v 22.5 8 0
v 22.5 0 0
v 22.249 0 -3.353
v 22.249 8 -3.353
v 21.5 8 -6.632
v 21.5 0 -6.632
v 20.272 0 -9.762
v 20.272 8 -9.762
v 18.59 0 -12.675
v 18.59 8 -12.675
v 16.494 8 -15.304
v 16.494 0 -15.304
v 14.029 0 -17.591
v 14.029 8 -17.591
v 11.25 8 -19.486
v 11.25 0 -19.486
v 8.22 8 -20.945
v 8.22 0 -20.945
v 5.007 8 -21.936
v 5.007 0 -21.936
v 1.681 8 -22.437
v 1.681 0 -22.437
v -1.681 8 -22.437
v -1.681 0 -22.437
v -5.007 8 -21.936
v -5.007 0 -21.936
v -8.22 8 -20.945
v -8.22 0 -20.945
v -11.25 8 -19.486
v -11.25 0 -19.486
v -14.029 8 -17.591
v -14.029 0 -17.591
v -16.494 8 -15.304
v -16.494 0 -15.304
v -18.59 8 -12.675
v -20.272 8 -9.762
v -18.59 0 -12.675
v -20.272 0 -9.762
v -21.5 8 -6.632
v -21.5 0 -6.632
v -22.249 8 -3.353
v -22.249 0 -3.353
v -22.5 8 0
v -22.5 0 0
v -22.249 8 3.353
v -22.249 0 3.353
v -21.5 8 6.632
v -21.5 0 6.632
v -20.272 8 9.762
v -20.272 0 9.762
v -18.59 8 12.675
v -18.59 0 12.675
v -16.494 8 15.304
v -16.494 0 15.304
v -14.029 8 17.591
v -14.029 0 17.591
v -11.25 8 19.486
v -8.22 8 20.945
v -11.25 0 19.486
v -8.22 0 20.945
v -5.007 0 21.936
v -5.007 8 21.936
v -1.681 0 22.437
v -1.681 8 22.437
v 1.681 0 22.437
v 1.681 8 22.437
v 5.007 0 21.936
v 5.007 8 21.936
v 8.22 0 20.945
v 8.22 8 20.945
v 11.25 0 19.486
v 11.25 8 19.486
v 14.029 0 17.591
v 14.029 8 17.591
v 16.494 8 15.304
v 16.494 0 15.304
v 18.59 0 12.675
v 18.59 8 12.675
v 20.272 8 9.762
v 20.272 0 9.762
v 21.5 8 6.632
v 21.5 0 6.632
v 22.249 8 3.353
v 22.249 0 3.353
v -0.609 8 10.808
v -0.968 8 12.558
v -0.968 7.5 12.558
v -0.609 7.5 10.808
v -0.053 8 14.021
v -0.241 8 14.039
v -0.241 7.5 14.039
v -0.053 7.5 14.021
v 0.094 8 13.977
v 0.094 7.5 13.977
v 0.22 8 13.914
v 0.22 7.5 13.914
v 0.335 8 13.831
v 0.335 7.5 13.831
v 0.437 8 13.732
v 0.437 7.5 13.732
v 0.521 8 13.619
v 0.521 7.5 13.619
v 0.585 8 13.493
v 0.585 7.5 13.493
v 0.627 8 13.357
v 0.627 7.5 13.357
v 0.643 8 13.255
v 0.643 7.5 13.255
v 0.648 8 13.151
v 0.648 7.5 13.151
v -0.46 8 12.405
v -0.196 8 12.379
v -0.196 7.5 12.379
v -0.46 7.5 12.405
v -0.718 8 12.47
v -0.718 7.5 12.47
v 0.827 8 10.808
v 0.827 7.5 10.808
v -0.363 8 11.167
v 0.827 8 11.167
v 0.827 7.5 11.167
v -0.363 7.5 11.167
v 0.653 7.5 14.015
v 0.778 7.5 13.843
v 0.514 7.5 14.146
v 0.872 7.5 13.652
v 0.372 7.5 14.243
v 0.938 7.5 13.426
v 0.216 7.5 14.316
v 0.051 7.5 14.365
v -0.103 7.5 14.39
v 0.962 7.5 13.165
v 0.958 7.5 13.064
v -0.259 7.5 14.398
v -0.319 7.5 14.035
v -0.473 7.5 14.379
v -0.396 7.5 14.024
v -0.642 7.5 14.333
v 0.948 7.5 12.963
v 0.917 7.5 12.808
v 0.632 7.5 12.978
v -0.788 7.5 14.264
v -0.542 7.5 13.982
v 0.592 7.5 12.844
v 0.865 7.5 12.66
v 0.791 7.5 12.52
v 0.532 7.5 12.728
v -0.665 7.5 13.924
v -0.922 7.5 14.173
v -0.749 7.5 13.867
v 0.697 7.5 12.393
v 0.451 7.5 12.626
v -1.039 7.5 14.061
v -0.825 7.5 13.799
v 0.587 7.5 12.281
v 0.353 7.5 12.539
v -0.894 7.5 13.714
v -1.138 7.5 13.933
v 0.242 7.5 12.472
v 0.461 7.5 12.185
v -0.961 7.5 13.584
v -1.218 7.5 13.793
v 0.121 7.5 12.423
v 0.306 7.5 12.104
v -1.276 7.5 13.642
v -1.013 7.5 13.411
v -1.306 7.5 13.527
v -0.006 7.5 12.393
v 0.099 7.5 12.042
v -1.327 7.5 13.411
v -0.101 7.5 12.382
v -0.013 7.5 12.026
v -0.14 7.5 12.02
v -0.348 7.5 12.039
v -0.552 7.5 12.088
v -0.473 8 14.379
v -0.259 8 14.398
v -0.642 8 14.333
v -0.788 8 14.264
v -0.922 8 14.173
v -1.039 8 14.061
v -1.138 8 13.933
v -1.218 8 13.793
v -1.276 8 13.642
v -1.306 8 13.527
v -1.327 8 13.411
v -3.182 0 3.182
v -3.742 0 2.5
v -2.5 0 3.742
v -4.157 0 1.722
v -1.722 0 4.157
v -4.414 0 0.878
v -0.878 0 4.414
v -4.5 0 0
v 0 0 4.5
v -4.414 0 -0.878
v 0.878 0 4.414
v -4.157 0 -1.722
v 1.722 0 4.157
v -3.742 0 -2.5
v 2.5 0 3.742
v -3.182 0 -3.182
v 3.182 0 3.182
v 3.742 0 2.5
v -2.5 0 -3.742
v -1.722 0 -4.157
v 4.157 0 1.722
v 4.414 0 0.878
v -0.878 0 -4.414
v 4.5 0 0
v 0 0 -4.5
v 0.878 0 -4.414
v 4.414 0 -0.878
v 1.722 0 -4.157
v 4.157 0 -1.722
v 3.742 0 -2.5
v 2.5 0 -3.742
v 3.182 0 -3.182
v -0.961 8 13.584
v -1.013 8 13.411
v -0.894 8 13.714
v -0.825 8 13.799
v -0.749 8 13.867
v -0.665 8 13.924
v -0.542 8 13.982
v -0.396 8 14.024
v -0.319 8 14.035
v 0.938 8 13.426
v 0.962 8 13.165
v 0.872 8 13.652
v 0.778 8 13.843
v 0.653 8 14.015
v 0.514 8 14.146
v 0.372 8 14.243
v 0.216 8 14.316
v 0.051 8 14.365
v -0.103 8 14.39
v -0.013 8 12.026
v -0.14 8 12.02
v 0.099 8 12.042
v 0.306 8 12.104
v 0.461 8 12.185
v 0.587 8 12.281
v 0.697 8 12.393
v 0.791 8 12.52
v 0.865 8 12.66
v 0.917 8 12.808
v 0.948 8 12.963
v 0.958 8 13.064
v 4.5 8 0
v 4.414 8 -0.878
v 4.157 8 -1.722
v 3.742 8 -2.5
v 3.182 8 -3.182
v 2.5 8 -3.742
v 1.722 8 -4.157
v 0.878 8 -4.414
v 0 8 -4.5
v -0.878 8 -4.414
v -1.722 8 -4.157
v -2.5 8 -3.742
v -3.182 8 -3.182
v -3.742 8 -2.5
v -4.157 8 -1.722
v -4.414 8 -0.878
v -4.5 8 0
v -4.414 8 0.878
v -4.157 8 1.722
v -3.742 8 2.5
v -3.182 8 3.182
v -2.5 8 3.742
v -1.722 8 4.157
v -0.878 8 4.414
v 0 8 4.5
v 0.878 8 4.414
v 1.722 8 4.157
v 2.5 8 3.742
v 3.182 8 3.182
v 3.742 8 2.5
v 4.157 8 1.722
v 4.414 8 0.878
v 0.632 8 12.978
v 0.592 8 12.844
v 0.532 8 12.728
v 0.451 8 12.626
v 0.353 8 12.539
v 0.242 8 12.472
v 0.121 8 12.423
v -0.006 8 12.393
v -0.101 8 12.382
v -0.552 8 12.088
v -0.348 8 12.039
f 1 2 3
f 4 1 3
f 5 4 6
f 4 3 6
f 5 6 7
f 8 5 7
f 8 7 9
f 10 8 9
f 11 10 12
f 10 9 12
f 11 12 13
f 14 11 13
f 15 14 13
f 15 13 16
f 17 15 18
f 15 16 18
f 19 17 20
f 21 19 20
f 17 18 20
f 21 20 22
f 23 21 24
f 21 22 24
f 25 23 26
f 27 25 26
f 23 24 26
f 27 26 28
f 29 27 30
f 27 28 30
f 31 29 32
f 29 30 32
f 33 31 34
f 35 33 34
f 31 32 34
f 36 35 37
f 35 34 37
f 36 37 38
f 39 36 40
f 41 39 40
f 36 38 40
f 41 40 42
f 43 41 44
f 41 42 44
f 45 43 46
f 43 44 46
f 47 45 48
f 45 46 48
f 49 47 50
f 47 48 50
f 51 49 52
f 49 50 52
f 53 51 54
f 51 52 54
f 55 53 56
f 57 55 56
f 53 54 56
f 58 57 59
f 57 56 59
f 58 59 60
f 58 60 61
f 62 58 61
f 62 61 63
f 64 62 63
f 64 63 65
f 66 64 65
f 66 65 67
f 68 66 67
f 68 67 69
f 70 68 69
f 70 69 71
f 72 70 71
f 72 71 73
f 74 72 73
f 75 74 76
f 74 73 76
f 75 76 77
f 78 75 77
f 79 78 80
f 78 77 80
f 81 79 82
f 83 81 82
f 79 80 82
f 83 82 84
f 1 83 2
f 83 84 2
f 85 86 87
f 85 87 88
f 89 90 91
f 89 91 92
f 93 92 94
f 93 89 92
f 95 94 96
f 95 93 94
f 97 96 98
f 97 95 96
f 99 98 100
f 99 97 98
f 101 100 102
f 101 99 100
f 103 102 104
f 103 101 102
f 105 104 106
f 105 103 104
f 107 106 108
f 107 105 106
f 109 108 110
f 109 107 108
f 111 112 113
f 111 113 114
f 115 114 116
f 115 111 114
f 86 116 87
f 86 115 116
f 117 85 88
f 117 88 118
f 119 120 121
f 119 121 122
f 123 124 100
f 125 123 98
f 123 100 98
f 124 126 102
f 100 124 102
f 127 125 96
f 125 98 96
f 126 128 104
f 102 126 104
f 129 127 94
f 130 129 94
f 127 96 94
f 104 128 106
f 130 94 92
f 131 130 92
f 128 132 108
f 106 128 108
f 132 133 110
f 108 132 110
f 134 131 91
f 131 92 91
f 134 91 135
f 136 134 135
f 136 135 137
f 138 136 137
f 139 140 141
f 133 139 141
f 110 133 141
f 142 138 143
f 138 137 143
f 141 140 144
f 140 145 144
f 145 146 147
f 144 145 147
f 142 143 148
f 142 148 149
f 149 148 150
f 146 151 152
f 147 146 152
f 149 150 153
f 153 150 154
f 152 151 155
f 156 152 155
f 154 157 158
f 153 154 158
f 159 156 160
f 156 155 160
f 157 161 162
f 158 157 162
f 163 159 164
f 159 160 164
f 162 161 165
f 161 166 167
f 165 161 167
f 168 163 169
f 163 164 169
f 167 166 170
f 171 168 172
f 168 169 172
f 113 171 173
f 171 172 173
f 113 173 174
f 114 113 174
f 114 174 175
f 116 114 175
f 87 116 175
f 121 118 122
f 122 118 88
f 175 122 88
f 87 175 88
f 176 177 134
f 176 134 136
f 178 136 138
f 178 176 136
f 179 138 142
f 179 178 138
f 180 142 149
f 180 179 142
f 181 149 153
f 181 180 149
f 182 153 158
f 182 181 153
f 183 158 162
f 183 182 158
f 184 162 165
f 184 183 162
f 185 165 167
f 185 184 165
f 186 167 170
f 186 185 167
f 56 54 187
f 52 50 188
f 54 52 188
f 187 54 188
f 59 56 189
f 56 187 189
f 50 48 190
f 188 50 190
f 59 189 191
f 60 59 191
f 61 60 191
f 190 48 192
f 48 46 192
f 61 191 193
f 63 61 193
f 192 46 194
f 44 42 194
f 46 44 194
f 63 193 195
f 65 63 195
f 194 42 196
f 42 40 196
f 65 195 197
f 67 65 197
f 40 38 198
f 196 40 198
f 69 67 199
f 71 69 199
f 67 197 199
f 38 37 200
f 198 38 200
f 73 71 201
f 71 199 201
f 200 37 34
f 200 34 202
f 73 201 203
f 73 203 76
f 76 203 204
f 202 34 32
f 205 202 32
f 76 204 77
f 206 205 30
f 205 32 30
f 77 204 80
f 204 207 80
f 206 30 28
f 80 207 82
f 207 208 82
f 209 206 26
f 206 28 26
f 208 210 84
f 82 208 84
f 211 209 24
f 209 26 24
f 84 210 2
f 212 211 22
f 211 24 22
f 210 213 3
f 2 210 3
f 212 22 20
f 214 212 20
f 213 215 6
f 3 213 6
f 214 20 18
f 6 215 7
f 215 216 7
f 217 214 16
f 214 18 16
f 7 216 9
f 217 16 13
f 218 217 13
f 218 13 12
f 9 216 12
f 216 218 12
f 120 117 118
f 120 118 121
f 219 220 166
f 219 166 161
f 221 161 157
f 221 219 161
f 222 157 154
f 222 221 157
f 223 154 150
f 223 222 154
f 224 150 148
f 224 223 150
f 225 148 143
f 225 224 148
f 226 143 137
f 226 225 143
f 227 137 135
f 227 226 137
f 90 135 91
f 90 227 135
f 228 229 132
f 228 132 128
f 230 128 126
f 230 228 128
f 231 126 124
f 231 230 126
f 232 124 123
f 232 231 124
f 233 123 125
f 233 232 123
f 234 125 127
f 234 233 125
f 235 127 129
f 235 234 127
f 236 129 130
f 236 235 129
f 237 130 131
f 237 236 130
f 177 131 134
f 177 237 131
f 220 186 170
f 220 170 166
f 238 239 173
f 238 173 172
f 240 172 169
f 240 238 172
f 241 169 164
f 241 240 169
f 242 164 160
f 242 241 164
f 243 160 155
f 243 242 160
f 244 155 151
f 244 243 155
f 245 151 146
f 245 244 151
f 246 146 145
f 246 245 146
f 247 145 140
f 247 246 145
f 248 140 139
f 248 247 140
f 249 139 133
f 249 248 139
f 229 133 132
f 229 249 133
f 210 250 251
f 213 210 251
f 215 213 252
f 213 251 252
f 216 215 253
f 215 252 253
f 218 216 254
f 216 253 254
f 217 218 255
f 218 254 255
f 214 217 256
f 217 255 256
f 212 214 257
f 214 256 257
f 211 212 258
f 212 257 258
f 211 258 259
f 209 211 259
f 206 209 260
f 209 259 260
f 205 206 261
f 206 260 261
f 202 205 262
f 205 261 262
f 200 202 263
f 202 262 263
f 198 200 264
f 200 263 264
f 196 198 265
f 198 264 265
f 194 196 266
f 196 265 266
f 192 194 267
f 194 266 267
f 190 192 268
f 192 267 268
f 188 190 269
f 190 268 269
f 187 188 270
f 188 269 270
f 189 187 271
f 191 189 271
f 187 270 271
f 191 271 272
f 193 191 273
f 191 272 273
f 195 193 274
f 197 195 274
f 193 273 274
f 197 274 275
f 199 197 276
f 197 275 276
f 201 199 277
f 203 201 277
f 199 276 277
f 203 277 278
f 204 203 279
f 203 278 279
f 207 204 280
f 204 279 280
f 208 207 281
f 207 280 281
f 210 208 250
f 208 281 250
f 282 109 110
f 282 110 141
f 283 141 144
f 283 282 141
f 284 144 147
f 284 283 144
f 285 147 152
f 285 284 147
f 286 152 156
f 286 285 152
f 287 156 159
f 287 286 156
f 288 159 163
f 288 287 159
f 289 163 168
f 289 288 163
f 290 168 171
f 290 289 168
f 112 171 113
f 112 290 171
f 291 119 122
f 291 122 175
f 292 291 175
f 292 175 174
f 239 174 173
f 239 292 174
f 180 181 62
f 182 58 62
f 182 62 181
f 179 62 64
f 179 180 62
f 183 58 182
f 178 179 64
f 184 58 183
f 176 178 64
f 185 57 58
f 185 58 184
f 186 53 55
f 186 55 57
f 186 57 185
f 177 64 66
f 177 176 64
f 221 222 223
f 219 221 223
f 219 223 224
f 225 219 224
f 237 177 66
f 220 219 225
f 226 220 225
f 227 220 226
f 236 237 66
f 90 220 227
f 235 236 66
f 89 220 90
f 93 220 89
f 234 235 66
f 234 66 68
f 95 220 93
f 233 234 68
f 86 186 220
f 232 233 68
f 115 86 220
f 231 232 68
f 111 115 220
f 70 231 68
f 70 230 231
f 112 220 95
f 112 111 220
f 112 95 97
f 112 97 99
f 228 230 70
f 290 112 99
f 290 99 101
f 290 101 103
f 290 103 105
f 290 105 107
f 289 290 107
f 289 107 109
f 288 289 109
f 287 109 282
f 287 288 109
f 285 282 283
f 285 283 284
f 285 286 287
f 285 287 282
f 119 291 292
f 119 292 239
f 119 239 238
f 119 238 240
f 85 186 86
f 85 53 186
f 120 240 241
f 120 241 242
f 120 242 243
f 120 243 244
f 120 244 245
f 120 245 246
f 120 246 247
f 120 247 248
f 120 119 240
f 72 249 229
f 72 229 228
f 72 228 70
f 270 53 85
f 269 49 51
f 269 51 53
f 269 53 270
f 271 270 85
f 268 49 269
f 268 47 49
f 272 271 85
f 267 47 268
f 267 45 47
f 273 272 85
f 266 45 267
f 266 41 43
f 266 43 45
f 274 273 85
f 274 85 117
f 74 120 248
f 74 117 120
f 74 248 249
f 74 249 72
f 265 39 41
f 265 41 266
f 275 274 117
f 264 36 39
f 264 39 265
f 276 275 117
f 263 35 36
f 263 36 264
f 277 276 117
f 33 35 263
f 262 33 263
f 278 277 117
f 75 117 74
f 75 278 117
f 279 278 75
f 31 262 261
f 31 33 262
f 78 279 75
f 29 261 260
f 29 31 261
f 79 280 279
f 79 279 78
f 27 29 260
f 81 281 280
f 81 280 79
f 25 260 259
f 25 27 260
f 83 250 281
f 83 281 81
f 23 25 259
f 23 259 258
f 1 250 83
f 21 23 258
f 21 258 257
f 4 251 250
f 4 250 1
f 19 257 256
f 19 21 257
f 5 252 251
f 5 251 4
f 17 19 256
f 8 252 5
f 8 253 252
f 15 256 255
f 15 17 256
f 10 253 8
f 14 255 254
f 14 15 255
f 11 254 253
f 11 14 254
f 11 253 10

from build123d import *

# Parameters (mm, degrees)
ESQUISSE1_R             = 22.5
BOSS_EXTRU_1_DEPTH      = 8
ESQUISSE2_R             = 4.5
ENL_V_MAT_EXTRU_1_DEPTH = 8
ENL_V_MAT_EXTRU_2_DEPTH = 0.5


with BuildPart() as part:
    # Esquisse1 → Boss.-Extru.1 (new body)
    with BuildSketch(Plane(origin=(0, 0, 0), x_dir=(1, 0, 0), z_dir=(0, 1, 0))):
        Circle(ESQUISSE1_R)
    extrude(amount=BOSS_EXTRU_1_DEPTH)

    # Esquisse2 → Enlèv. mat.-Extru.1 (cut)
    with BuildSketch(Plane(origin=(0, 8, 0), x_dir=(1, 0, 0), z_dir=(0, 1, 0))):
        Circle(ESQUISSE2_R)
    extrude(amount=-ENL_V_MAT_EXTRU_1_DEPTH, mode=Mode.SUBTRACT)

    # Esquisse3 → Enlèv. mat.-Extru.2 (cut)
    with BuildSketch(Plane(origin=(0, 8, 0), x_dir=(1, 0, 0), z_dir=(0, 1, 0))):
        with BuildLine():
            Line((0.827199958, -10.808267064), (0.827199958, -11.167241423))
            Line((0.827199958, -11.167241423), (-0.36330485, -11.167241423))
            Line((-0.36330485, -11.167241423), (-0.551906612, -12.08781434))
            add(Edge.make_bspline(
                [(-0.551906612, -12.08781434), (-0.514850738, -12.077584068), (-0.443060842, -12.057764534), (-0.337100981, -12.035758764), (-0.236508778, -12.02249332), (-0.171233407, -12.020682009), (-0.139646997, -12.019805526)],
                knots=[0, 0, 0, 0, 0.000115302, 0.000223379, 0.000324431, 0.000419176, 0.000419176, 0.000419176, 0.000419176], degree=3))
            add(Edge.make_bspline(
                [(-0.139646997, -12.019805526), (-0.100563257, -12.020651461), (-0.02371486, -12.022314782), (0.088724087, -12.038286632), (0.19605698, -12.063426546), (0.29805935, -12.098547068), (0.394919901, -12.143456801), (0.485747463, -12.199556742), (0.571905376, -12.265090073), (0.65184797, -12.340435085), (0.724372278, -12.423356702), (0.788138267, -12.512514573), (0.842300858, -12.607042235), (0.885861613, -12.707842843), (0.920645947, -12.813801997), (0.943797942, -12.926034579), (0.959214651, -13.043482699), (0.960937037, -13.123787269), (0.961815343, -13.164737417)],
                knots=[0, 0, 0, 0, 0.00011719, 0.000230425, 0.000339944, 0.000447481, 0.000553499, 0.000659556, 0.000767111, 0.000877722, 0.000988528, 0.001097091, 0.001206056, 0.001314692, 0.001425996, 0.001539995, 0.001658004, 0.001780798, 0.001780798, 0.001780798, 0.001780798], degree=3))
            add(Edge.make_bspline(
                [(0.961815343, -13.164737417), (0.961150268, -13.193259637), (0.959829105, -13.249918625), (0.953110517, -13.334062825), (0.940174801, -13.416425658), (0.922807077, -13.49701805), (0.900264659, -13.575687422), (0.872975605, -13.65265895), (0.839579578, -13.727453557), (0.802948202, -13.800778952), (0.761701724, -13.870977459), (0.715923217, -13.936626446), (0.667557726, -13.998710727), (0.61551634, -14.05656446), (0.559315345, -14.109807478), (0.499635378, -14.15875576), (0.436952659, -14.20423709), (0.370297417, -14.244405285), (0.301154934, -14.281368241), (0.228526717, -14.311691779), (0.154066016, -14.338802307), (0.076701141, -14.360411834), (-0.003392672, -14.377344389), (-0.086347447, -14.38884499), (-0.171728117, -14.397221427), (-0.22960313, -14.397745784), (-0.258837702, -14.398010654)],
                knots=[0, 0, 0, 0, 8.5583e-05, 0.000170009, 0.000253005, 0.000335518, 0.000417186, 0.000498352, 0.000580291, 0.000662755, 0.000744161, 0.000824288, 0.000902692, 0.000980133, 0.001057498, 0.001134702, 0.00121156, 0.001289599, 0.001368002, 0.001446531, 0.001525481, 0.001605609, 0.001687289, 0.001770875, 0.001856759, 0.001944425, 0.001944425, 0.001944425, 0.001944425], degree=3))
            add(Edge.make_bspline(
                [(-0.258837702, -14.398010654), (-0.293711883, -14.397319816), (-0.362322713, -14.395960674), (-0.462843281, -14.381742189), (-0.559557886, -14.361378272), (-0.651687987, -14.330742002), (-0.740059251, -14.292354708), (-0.823481969, -14.243838536), (-0.904087745, -14.188859432), (-0.978599782, -14.123979079), (-1.047755895, -14.053063397), (-1.109662404, -13.976105756), (-1.164795981, -13.894376314), (-1.212273728, -13.80747816), (-1.252771749, -13.715639629), (-1.284586737, -13.618516628), (-1.310265092, -13.516616624), (-1.321128513, -13.446463114), (-1.326646196, -13.410831167)],
                knots=[0, 0, 0, 0, 0.000104552, 0.000205693, 0.000304023, 0.000400691, 0.00049644, 0.000592535, 0.000689779, 0.000788716, 0.000888377, 0.000986596, 0.001084603, 0.001183757, 0.001283279, 0.001385267, 0.001490017, 0.001598135, 0.001598135, 0.001598135, 0.001598135], degree=3))
            Line((-1.326646196, -13.410831167), (-1.012543632, -13.410831167))
            add(Edge.make_bspline(
                [(-1.012543632, -13.410831167), (-1.004815074, -13.444207619), (-0.989960358, -13.508359014), (-0.957354609, -13.598490355), (-0.917488734, -13.678809579), (-0.870084385, -13.750379162), (-0.813534355, -13.81278816), (-0.749004926, -13.868405221), (-0.676657202, -13.918580351), (-0.596263973, -13.960403118), (-0.511450894, -13.996071871), (-0.422683684, -14.019823566), (-0.332379337, -14.036524459), (-0.271300967, -14.03819622), (-0.240608535, -14.039036295)],
                knots=[0, 0, 0, 0, 0.000102709, 0.000197412, 0.000286774, 0.000371169, 0.000454082, 0.000538572, 0.000626283, 0.000717552, 0.000809994, 0.00090168, 0.00099274, 0.001084718, 0.001084718, 0.001084718, 0.001084718], degree=3))
            add(Edge.make_bspline(
                [(-0.240608535, -14.039036295), (-0.210650091, -14.038215517), (-0.151661669, -14.036599399), (-0.064850282, -14.024160386), (0.018962592, -14.005002815), (0.098949949, -13.97633296), (0.176511488, -13.941488242), (0.249685259, -13.896773166), (0.320588136, -13.845313148), (0.38701627, -13.786356517), (0.447855719, -13.721386823), (0.50161184, -13.651909429), (0.546388753, -13.577792583), (0.584122862, -13.50031943), (0.612776161, -13.418640873), (0.633217142, -13.333139698), (0.645220201, -13.243604717), (0.646871381, -13.182535408), (0.647712779, -13.151416103)],
                knots=[0, 0, 0, 0, 8.9842e-05, 0.0001769, 0.000262612, 0.000347317, 0.000431396, 0.000517249, 0.000604055, 0.000693954, 0.000783242, 0.000870748, 0.000956963, 0.001042571, 0.001128832, 0.00121607, 0.001305907, 0.001399251, 0.001399251, 0.001399251, 0.001399251], degree=3))
            add(Edge.make_bspline(
                [(0.647712779, -13.151416103), (0.647054299, -13.123340351), (0.645765419, -13.068386062), (0.635234849, -12.987986855), (0.616917877, -12.911913813), (0.591493997, -12.839799579), (0.559214489, -12.771576137), (0.519768177, -12.707173077), (0.472414779, -12.647439243), (0.41832289, -12.59234669), (0.359064849, -12.541501815), (0.293621107, -12.498157728), (0.22336118, -12.461693811), (0.14913158, -12.430225812), (0.069166682, -12.407625067), (-0.014949951, -12.390657182), (-0.104126659, -12.380841819), (-0.165097347, -12.379479931), (-0.196437862, -12.378779885)],
                knots=[0, 0, 0, 0, 8.4208e-05, 0.000164824, 0.000242709, 0.000318547, 0.000393815, 0.000468731, 0.000544614, 0.00062196, 0.000700062, 0.000778428, 0.000856831, 0.000937299, 0.001019835, 0.001105635, 0.00119452, 0.001288536, 0.001288536, 0.001288536, 0.001288536], degree=3))
            add(Edge.make_bspline(
                [(-0.196437862, -12.378779885), (-0.223566791, -12.379360476), (-0.279581146, -12.380559249), (-0.365503973, -12.389385746), (-0.455795696, -12.40362504), (-0.550110192, -12.423211288), (-0.6487307, -12.448842365), (-0.751449101, -12.479556865), (-0.858481367, -12.516278864), (-0.930599092, -12.544011078), (-0.967671837, -12.558267064)],
                knots=[0, 0, 0, 0, 8.1378e-05, 0.000168026, 0.000258858, 0.000355524, 0.000456875, 0.000564457, 0.000677092, 0.000796243, 0.000796243, 0.000796243, 0.000796243], degree=3))
            Line((-0.967671837, -12.558267064), (-0.608697478, -10.808267064))
            Line((-0.608697478, -10.808267064), (0.827199958, -10.808267064))
        make_face()
    extrude(amount=-ENL_V_MAT_EXTRU_2_DEPTH, mode=Mode.SUBTRACT)


solid = part.part
